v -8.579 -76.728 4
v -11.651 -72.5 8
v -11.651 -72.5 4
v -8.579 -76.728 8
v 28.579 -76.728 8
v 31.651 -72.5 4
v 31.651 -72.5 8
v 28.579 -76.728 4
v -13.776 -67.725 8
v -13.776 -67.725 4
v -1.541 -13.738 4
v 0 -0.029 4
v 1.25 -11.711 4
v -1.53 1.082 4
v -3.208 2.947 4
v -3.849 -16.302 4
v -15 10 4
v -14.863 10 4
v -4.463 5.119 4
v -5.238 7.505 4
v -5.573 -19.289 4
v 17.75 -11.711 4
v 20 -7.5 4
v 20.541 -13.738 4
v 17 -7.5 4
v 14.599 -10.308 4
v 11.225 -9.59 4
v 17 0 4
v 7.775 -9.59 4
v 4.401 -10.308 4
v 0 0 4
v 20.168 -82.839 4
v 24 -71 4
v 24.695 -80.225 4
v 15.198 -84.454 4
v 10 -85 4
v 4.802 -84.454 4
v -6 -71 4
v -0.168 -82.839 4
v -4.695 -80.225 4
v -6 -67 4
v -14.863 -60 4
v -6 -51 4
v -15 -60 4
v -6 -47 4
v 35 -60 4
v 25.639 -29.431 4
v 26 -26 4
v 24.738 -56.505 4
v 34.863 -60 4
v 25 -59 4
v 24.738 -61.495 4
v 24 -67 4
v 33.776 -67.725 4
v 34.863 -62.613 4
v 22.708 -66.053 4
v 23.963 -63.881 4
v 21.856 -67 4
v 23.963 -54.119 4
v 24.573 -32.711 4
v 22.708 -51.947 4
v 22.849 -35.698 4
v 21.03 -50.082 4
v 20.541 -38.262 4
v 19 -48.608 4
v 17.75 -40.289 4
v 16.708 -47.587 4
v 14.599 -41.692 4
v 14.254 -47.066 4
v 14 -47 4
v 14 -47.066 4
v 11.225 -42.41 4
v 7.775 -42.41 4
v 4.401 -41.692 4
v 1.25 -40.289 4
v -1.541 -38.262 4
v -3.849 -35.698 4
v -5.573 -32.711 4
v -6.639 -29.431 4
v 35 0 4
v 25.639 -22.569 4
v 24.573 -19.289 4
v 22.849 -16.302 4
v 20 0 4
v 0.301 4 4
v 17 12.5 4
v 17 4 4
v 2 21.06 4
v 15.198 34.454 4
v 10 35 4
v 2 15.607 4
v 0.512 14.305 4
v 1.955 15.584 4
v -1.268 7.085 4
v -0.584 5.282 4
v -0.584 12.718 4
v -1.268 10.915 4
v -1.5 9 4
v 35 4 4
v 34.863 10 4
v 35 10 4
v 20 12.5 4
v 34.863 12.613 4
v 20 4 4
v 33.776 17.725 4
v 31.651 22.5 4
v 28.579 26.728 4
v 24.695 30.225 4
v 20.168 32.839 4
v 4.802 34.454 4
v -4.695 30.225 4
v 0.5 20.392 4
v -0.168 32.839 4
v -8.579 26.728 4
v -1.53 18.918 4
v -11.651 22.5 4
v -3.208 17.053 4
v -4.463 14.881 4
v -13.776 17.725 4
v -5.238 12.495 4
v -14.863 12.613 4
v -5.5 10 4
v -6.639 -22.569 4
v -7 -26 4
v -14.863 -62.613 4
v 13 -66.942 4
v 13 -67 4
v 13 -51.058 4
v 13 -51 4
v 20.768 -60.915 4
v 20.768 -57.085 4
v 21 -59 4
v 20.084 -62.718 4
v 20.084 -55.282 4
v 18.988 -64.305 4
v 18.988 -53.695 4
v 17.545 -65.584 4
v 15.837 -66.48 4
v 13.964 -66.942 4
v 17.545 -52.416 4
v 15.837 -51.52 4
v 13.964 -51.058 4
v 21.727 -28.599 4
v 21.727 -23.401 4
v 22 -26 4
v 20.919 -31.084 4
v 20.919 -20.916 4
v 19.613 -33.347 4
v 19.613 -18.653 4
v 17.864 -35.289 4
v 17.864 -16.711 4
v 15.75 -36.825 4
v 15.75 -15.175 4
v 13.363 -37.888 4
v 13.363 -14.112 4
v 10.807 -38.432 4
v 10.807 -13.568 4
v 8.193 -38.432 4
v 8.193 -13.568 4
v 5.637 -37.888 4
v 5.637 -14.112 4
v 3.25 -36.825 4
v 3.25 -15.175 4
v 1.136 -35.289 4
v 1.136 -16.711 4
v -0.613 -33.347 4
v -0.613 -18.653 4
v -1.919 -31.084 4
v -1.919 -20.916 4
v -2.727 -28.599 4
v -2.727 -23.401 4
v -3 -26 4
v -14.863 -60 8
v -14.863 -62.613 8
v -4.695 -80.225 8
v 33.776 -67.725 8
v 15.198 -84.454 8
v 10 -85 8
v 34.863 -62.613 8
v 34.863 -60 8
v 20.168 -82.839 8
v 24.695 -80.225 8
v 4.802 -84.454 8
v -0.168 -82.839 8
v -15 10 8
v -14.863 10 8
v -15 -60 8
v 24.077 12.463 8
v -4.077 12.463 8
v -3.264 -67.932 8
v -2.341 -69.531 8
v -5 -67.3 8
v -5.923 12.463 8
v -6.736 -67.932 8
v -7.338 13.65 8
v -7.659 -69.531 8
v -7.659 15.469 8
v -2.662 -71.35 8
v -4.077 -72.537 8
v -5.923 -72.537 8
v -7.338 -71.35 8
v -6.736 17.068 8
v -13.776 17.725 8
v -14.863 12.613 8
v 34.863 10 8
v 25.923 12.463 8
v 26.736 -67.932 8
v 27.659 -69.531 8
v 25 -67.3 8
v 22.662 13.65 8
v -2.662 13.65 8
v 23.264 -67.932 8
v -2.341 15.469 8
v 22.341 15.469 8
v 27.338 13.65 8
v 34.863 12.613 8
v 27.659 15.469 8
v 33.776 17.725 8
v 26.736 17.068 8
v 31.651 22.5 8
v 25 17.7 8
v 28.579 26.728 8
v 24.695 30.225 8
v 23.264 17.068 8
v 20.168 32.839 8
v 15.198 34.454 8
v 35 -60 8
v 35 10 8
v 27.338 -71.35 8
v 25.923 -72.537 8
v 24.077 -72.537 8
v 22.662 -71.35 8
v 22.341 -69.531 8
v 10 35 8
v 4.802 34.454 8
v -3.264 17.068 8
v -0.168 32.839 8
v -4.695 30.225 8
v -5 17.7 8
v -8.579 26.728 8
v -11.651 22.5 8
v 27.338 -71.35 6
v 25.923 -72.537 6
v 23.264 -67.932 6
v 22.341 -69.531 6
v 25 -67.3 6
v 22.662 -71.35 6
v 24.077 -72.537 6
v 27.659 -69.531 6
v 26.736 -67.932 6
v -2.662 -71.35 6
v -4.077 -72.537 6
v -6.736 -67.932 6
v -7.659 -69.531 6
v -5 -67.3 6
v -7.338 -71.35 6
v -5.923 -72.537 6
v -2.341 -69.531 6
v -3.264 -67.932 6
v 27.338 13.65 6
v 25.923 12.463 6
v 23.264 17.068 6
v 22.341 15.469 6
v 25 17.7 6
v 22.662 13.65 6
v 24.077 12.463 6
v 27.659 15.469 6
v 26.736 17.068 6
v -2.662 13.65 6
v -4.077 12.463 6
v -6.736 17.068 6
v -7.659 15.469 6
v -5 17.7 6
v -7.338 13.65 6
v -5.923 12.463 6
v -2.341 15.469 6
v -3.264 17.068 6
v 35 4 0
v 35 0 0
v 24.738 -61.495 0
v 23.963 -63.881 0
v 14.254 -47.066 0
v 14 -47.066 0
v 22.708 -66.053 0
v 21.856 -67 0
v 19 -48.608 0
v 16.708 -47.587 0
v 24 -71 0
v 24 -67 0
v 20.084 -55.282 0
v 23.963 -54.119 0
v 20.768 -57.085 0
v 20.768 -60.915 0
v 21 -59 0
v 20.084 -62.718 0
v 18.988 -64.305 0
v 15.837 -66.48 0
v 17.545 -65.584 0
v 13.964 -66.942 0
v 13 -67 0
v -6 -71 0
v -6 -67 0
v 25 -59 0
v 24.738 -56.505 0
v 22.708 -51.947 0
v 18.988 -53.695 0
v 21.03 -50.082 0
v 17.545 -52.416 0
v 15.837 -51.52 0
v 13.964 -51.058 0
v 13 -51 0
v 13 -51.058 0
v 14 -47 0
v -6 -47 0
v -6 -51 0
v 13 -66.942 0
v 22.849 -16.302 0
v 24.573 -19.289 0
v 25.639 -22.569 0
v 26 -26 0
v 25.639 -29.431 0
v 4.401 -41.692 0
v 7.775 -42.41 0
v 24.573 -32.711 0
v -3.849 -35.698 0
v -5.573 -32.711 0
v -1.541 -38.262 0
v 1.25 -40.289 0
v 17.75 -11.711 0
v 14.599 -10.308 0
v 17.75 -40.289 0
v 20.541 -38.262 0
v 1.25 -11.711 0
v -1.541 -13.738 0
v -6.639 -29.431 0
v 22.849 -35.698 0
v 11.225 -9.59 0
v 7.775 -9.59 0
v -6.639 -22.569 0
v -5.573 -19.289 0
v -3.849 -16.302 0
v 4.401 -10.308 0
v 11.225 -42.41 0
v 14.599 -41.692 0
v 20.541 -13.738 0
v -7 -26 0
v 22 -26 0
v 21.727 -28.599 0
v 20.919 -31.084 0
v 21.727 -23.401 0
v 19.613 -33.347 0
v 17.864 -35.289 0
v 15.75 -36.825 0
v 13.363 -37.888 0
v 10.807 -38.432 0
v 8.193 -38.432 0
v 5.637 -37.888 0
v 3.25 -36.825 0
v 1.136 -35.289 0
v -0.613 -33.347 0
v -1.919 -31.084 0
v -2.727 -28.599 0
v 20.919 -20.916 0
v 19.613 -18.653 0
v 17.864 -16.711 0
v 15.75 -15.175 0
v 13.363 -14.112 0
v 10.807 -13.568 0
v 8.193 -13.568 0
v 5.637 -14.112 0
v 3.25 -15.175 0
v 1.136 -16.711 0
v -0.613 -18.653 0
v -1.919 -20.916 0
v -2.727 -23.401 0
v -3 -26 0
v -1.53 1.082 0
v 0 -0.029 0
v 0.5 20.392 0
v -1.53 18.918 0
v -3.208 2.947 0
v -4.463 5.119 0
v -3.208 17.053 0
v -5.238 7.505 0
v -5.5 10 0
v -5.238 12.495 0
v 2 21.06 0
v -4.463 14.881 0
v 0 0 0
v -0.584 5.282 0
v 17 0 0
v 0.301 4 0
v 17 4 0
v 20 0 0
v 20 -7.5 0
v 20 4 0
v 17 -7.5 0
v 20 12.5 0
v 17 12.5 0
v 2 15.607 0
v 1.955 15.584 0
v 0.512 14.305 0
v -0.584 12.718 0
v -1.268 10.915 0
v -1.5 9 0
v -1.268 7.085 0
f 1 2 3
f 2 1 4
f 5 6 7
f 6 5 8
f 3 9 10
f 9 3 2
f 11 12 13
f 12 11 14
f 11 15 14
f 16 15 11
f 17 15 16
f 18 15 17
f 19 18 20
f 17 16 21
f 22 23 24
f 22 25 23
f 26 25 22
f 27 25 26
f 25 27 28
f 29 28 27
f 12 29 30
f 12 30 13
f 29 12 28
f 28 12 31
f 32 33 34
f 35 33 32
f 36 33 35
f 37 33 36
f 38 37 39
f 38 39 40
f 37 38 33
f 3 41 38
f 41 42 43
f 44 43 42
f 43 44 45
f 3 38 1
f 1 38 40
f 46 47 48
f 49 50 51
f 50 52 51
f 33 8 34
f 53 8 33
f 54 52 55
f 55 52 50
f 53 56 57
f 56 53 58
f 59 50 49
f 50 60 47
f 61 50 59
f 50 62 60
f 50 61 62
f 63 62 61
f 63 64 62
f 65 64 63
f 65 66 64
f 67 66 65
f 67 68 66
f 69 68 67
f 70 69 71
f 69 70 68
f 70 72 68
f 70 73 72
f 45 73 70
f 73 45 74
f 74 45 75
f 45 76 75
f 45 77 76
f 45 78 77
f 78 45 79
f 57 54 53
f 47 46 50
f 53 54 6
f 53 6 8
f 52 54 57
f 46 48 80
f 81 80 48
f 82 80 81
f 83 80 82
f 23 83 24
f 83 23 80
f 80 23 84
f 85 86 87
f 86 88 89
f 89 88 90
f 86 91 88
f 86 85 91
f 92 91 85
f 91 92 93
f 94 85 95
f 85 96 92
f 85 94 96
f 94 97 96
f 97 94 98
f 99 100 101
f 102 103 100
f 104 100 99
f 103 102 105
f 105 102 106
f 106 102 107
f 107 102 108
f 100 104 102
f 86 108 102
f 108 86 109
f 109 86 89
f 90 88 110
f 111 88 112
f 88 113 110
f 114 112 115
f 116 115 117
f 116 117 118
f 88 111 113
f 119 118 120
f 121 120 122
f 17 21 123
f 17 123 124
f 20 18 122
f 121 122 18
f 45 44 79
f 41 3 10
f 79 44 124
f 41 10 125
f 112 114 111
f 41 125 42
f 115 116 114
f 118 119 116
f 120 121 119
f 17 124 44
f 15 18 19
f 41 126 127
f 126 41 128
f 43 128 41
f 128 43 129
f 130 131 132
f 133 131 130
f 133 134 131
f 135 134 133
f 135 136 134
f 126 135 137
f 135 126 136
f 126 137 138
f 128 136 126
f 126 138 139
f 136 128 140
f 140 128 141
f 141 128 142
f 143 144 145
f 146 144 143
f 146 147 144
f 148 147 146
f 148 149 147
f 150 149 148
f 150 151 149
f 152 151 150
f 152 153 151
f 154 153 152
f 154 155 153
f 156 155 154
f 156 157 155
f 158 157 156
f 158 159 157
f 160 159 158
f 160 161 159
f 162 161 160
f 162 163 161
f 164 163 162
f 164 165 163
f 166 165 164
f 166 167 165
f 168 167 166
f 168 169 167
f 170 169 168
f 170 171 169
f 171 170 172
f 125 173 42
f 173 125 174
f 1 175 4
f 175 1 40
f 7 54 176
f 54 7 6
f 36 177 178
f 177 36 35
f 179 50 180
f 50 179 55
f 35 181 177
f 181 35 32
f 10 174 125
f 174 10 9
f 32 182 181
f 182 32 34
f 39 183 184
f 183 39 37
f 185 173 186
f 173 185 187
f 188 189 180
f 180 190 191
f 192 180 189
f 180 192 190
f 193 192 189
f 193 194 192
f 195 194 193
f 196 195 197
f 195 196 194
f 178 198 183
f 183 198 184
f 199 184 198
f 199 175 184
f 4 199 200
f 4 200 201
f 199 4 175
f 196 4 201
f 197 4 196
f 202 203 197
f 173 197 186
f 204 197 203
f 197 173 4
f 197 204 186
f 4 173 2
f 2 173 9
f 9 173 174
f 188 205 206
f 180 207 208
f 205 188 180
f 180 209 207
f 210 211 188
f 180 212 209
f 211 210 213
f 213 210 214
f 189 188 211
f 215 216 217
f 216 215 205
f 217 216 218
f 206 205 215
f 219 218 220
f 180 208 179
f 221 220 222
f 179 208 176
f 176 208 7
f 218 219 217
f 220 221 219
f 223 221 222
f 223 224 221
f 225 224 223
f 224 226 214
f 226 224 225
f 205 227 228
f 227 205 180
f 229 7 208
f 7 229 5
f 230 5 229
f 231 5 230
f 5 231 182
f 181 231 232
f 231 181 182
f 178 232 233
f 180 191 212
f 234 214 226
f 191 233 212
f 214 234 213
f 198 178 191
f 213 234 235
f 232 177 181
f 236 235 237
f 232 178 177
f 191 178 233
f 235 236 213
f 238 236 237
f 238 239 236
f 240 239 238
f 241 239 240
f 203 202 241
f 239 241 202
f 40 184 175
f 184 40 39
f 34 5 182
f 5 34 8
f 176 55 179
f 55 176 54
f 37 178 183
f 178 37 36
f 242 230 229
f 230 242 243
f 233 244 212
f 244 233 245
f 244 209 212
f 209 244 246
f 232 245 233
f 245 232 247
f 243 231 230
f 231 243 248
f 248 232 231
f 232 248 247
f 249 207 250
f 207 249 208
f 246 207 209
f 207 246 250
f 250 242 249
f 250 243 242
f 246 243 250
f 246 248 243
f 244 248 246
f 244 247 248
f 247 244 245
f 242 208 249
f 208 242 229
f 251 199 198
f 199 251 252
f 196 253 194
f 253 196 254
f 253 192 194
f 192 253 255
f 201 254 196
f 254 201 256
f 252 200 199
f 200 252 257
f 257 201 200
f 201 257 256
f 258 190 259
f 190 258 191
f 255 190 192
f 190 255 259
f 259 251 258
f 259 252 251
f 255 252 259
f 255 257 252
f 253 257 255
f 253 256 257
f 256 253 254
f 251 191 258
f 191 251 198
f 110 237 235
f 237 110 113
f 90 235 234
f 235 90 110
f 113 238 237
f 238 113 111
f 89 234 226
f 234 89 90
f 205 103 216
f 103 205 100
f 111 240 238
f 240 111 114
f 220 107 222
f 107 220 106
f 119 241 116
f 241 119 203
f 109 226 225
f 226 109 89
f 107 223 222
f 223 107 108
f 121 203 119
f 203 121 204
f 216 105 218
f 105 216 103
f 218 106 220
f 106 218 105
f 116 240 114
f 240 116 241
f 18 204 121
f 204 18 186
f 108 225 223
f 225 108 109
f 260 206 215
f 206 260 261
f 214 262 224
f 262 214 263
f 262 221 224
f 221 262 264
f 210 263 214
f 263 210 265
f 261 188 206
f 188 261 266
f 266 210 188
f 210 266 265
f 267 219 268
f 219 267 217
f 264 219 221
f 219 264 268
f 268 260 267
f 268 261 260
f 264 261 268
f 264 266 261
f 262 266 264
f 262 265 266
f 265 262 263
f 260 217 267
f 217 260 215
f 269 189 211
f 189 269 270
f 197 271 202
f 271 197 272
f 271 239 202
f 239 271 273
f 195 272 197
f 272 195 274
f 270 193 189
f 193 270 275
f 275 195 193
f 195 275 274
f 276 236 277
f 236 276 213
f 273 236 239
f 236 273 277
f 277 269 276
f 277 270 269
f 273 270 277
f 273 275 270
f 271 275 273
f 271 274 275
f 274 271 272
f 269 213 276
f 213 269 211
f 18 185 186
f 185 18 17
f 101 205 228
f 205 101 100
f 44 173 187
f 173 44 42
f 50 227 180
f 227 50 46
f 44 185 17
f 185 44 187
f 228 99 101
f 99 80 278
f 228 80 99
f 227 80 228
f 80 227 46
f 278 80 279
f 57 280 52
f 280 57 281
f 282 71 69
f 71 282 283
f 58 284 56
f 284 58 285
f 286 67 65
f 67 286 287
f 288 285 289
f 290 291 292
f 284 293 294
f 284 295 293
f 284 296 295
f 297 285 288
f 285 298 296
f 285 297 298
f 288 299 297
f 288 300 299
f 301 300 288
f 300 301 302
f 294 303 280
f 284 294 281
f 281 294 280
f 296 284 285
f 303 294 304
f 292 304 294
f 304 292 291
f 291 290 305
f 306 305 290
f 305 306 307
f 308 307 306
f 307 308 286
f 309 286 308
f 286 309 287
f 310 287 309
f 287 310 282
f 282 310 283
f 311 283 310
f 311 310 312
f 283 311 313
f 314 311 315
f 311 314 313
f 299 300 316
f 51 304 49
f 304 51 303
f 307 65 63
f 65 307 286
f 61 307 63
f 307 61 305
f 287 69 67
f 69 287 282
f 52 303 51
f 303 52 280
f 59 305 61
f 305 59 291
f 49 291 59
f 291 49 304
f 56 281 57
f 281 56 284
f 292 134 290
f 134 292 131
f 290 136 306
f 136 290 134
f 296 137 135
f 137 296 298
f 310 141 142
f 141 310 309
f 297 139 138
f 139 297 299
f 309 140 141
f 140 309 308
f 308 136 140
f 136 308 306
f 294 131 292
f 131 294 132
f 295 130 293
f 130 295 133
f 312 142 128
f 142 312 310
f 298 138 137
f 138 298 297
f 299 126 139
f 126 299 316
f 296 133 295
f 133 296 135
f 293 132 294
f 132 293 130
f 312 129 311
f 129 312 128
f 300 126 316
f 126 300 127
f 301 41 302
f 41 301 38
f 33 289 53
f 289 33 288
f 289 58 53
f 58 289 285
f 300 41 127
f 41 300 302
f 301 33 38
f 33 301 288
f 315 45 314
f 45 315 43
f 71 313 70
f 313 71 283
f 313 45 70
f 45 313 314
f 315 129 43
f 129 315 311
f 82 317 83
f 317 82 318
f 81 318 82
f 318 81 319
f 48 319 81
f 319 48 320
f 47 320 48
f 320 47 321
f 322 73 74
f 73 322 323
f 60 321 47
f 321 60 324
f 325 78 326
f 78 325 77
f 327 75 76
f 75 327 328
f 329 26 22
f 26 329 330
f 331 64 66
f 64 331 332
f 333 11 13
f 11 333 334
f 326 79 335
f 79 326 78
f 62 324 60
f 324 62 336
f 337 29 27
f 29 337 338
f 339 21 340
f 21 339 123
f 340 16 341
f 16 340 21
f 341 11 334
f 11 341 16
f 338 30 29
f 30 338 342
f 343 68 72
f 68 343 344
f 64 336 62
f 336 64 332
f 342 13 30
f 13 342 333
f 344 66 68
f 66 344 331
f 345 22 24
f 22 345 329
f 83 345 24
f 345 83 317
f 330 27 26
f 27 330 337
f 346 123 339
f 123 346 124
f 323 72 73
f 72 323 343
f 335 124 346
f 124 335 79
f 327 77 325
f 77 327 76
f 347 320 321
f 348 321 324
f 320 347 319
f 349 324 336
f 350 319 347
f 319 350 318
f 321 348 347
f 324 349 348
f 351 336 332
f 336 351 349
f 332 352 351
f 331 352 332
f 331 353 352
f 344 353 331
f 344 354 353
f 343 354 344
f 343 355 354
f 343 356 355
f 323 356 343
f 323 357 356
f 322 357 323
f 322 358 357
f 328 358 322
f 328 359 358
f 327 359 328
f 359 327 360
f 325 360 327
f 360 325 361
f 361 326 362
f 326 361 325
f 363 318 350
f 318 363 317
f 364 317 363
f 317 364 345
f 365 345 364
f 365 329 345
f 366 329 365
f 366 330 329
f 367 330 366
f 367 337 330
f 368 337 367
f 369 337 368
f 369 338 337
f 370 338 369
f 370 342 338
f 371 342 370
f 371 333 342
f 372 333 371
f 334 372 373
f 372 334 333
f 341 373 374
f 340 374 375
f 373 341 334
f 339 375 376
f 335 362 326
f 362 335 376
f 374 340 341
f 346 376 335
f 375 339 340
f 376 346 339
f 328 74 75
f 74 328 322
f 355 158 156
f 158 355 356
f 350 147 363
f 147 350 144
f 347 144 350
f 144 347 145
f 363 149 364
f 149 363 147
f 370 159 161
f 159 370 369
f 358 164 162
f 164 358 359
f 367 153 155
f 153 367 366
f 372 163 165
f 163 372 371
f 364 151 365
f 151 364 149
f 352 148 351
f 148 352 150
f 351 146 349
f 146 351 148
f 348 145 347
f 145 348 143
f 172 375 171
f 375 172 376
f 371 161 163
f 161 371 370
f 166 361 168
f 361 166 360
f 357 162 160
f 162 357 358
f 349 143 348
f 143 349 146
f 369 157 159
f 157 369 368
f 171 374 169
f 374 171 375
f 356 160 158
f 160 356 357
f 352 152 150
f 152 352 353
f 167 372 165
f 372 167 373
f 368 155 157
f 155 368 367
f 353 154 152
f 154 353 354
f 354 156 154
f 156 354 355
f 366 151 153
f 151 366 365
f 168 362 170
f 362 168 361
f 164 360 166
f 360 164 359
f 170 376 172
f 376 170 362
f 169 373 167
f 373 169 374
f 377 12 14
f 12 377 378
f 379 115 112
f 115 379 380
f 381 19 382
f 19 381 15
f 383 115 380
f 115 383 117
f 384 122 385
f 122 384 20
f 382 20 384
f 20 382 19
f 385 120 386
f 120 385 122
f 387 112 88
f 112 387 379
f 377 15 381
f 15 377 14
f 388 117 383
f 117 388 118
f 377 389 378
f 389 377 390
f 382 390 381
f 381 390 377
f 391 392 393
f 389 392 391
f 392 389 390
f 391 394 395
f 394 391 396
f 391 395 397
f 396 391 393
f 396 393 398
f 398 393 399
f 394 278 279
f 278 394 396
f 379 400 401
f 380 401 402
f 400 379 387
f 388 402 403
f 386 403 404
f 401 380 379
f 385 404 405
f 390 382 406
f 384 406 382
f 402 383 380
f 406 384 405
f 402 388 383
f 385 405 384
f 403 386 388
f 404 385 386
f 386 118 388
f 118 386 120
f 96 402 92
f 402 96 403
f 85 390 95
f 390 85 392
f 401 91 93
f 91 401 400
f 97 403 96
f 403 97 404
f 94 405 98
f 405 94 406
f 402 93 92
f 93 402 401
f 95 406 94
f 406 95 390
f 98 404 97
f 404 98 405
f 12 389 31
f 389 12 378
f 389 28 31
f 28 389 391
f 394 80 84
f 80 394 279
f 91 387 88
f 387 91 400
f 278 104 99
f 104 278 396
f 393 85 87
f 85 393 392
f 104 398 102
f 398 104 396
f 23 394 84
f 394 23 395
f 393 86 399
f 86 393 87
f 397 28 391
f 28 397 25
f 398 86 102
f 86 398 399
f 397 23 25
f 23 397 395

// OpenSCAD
//основа


union(){
rotate([0,0,90])
translate([-60,-35,4])
union(){  
cube([70,50,4]);
difference(){  
  
  translate([0,25,0]) cylinder(4,25,25);
  translate([-10,10,2]) cylinder(2,2.7,2.7);
  translate([-10,40,2]) cylinder(2,2.7,2.7);
  }

difference(){

  translate([70,25,0]) cylinder(4,25,25);
  translate([75,10,2]) cylinder(2,2.7,2.7);
  translate([75,40,2]) cylinder(2,2.7,2.7);

  }
}

}






union(){ 
//буква n
translate([0,-40,8])
rotate([180,0,90]){
  rotate(-90,0,0)
   translate([-23,46,4])

union(){
difference(){
  translate([10,-65,0]) cylinder(4,12,12); 
  translate([10,-65,0]) cylinder(4,8,8);

translate([10,-78,0]) cube(40);
}
  translate([-1,-77,0]) cube([30,4,4]);
  translate([9,-57,0]) cube([20,4,4]);
}
}
}

//буква О
difference(){
  translate([9.5,-26,0]) cylinder(4,16.5,16.5);
  translate([9.5,-26,0]) cylinder(4,12.5,12.5);
}

//буква t
cube([35,4,4]);
difference(){
  translate([6.5,10,0]) cylinder(4,12,12);
  translate([6.5,9,0]) cylinder(4,8,8);
  translate([0,-5,0]) cube([15,5,4]);
  translate([2,0,0]) cube([17,25,4]);
}
  translate([17,-7.5,0]) cube([3,20,4]);
